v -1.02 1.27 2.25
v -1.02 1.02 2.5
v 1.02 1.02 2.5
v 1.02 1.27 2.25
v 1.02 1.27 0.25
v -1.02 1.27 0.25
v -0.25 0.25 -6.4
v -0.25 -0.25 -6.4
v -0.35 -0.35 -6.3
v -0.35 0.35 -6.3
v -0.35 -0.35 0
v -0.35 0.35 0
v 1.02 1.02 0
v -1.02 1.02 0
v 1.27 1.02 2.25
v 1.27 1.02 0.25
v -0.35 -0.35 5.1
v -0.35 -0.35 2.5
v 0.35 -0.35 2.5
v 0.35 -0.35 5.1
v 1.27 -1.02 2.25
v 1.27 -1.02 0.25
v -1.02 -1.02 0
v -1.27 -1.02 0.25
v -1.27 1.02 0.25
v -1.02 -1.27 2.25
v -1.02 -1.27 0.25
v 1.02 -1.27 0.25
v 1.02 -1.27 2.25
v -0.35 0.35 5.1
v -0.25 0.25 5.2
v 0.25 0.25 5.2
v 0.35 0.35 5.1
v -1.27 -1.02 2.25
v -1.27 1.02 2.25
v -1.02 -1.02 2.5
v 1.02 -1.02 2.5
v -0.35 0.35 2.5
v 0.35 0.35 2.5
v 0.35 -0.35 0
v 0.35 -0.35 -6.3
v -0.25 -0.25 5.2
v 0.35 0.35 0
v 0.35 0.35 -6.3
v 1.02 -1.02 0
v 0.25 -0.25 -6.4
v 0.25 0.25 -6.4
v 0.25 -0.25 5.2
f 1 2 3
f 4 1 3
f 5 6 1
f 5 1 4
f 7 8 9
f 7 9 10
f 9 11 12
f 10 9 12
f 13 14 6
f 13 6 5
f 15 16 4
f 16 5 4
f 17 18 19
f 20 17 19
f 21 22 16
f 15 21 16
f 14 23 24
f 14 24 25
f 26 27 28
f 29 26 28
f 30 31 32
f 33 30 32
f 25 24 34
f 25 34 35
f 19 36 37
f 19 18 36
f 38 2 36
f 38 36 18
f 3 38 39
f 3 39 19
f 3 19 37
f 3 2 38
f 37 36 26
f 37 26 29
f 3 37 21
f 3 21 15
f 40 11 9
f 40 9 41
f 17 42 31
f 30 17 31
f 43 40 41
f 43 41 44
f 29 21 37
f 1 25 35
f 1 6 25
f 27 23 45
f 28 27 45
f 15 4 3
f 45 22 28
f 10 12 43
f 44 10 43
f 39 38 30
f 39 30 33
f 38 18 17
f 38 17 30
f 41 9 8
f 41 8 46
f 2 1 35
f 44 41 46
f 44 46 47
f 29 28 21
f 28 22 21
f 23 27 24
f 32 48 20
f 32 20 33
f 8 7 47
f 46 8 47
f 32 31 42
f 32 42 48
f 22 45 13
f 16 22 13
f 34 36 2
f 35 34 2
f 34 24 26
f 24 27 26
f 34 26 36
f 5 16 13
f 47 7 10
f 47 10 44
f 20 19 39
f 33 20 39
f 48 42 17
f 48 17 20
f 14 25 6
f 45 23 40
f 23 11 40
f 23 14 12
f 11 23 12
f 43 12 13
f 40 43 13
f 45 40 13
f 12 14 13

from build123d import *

# Parameters (mm, degrees)
F0_W          = 2.54
F0_H          = 2.54
F1_DEPTH      = 2.5
F2_SIZE       = 0.25
F3_W          = 0.7
F3_H          = 0.7
F4_DEPTH      = 2.7
F4_DEPTH_BACK = 8.9
F5_SIZE       = 0.1


with BuildPart() as f1:
    # F0 (on Top) → F1 (new body)
    with BuildSketch(Plane.XY):
        Rectangle(F0_W, F0_H)
    extrude(amount=F1_DEPTH)

    # F2
    f2_edges = [f1.edges().sort_by_distance(p)[0] for p in [
        (-1.27, -1.27, 1.25),
        (1.27, -1.27, 1.25),
        (1.27, 1.27, 1.25),
        (-1.27, 1.27, 1.25),
        (0, 1.27, 2.5),
        (1.27, 0, 2.5),
        (0, -1.27, 2.5),
        (-1.27, 0, 2.5),
        (1.27, 0, 0),
        (0, -1.27, 0),
        (-1.27, 0, 0),
        (0, 1.27, 0),
    ]]
    chamfer(f2_edges, length=F2_SIZE)

    # F3 (on face) → F4 (join, two sides)
    with BuildSketch(Plane.XY.offset(2.5)) as f4_sk:
        Rectangle(F3_W, F3_H)
    extrude(amount=F4_DEPTH)
    extrude(f4_sk.sketch, amount=-F4_DEPTH_BACK)

    # F5
    f5_edges = [f1.edges().sort_by_distance(p)[0] for p in [
        (0.35, 0, 5.2),
        (0, 0.35, 5.2),
        (-0.35, 0, 5.2),
        (0, -0.35, 5.2),
        (0.35, 0, -6.4),
        (0, -0.35, -6.4),
        (-0.35, 0, -6.4),
        (0, 0.35, -6.4),
    ]]
    chamfer(f5_edges, length=F5_SIZE)


solid = f1.part
